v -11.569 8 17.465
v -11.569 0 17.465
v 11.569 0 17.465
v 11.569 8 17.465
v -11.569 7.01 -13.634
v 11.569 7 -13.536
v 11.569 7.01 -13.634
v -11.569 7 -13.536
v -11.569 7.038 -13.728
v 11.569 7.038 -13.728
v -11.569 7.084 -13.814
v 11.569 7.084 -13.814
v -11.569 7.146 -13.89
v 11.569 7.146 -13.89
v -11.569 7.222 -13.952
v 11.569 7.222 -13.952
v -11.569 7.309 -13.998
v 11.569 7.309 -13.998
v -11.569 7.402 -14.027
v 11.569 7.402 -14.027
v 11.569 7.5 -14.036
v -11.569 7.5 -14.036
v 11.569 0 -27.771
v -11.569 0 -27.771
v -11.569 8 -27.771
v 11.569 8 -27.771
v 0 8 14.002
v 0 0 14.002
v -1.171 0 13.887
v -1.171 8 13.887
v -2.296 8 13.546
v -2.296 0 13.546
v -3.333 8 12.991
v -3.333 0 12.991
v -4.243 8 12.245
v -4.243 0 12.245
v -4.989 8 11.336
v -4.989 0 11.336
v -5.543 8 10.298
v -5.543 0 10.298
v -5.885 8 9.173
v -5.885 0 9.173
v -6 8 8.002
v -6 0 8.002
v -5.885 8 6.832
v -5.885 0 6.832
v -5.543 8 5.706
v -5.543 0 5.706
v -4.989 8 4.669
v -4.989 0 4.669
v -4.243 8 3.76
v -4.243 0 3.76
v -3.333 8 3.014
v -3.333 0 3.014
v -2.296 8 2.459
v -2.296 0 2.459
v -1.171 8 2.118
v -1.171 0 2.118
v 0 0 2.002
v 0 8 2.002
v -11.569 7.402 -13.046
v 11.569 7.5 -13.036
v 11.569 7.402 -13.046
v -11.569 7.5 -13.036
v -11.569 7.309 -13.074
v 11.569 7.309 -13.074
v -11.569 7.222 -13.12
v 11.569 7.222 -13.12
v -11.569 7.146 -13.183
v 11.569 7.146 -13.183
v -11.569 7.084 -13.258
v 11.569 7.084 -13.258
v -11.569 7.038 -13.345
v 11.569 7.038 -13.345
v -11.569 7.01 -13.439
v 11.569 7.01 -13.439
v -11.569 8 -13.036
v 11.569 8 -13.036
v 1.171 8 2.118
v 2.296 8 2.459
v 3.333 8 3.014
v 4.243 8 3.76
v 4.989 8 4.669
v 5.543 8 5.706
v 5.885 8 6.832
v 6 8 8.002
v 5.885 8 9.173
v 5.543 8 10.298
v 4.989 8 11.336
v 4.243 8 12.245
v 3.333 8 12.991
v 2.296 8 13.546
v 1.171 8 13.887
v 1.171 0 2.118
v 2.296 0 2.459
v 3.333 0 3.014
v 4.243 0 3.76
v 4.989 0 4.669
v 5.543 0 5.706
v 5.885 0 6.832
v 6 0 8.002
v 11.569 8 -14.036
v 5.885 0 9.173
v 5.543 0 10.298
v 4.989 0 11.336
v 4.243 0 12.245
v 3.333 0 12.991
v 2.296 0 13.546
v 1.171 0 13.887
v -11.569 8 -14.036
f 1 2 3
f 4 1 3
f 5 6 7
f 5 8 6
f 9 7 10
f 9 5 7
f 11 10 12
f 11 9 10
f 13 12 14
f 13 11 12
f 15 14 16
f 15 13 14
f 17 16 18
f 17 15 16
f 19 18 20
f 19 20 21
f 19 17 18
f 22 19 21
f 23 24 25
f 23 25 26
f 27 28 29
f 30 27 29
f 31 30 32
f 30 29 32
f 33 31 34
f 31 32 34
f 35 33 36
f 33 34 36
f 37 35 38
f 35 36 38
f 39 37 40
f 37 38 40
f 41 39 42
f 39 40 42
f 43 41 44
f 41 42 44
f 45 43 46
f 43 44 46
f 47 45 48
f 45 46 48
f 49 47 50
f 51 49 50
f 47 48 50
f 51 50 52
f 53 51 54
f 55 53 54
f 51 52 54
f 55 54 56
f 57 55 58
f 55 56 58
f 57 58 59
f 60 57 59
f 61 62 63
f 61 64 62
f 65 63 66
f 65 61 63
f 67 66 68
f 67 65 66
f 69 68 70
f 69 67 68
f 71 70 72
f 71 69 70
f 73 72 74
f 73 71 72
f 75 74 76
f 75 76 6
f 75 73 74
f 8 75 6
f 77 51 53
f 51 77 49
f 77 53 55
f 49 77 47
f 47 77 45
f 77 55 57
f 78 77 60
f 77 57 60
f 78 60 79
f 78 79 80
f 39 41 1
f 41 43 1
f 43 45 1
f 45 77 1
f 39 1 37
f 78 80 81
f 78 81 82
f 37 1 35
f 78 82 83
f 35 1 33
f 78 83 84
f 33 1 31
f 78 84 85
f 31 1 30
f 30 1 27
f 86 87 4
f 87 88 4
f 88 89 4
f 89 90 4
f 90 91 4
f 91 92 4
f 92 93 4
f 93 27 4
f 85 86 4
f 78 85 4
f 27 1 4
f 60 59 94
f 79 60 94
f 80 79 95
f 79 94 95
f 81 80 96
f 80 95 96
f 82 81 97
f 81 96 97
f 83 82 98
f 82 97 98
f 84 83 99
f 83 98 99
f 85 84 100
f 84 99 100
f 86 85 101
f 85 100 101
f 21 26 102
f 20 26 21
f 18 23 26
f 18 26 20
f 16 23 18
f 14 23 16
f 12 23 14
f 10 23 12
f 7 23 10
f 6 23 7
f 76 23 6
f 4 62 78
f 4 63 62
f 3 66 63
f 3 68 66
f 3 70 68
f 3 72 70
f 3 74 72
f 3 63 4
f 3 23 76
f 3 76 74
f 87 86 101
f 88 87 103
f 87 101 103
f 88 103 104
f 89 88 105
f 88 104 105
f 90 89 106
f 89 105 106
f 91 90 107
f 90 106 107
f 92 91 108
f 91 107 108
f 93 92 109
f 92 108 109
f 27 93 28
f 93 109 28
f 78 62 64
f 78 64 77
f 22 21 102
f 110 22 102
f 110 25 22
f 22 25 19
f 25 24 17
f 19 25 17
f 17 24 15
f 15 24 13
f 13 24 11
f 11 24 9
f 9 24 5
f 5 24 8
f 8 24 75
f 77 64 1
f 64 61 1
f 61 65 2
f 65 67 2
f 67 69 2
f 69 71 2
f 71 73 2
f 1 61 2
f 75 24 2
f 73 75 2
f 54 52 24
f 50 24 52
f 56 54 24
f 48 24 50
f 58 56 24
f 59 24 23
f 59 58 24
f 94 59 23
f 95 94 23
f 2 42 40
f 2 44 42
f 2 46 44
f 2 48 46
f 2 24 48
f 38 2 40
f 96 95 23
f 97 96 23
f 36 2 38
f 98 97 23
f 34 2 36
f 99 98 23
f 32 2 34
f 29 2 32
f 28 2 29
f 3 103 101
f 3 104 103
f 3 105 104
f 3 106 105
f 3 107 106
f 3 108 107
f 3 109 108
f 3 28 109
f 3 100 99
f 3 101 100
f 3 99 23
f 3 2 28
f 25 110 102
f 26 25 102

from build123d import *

# Parameters (mm, degrees)
BOSS_EXTRUDE1_DEPTH = 8
SKETCH2_W           = 23.137445614
SKETCH2_H           = 10.306738945
BOSS_EXTRUDE2_DEPTH = 8
SKETCH4_W           = 1
SKETCH4_H           = 2
CUT_EXTRUDE1_DEPTH  = 60
FILLET1_R           = 0.5


with BuildPart() as part:
    # Sketch1 → Boss-Extrude1 (new body)
    with BuildSketch(Plane(origin=(0, 0, 0), x_dir=(1, 0, 0), z_dir=(0, 1, 0))):
        with BuildLine():
            Line((11.568722807, -17.464704369), (11.568722807, 17.464704369))
            Line((11.568722807, 17.464704369), (0, 17.464704369))
            Line((0, 17.464704369), (0, -2.002357687))
            ThreePointArc((0, -2.002357687), (4.242640687, -3.759717), (6, -8.002357687))
            ThreePointArc((6, -8.002357687), (4.242640687, -12.244998375), (0, -14.002357687))
            Line((0, -14.002357687), (0, -17.464704369))
            Line((0, -17.464704369), (11.568722807, -17.464704369))
        make_face()
        with BuildLine():
            Line((0, -2.002357687), (0, 17.464704369))
            Line((0, 17.464704369), (-11.568722807, 17.464704369))
            Line((-11.568722807, 17.464704369), (-11.568722807, -17.464704369))
            Line((-11.568722807, -17.464704369), (0, -17.464704369))
            Line((0, -17.464704369), (0, -14.002357687))
            ThreePointArc((0, -14.002357687), (-6, -8.002357687), (0, -2.002357687))
        make_face()
    extrude(amount=BOSS_EXTRUDE1_DEPTH)

    # Sketch2 → Boss-Extrude2 (add)
    with BuildSketch(Plane.XZ):
        with Locations((0, -22.618073841)):
            Rectangle(SKETCH2_W, SKETCH2_H)
    extrude(amount=-BOSS_EXTRUDE2_DEPTH)

    # Sketch4 → Cut-Extrude1 (cut)
    with BuildSketch(Plane(origin=(11.568722807, 0, 0), x_dir=(0, 0, -1), z_dir=(1, 0, 0))):
        with Locations((13.536168456, 8)):
            Rectangle(SKETCH4_W, SKETCH4_H)
    extrude(amount=-CUT_EXTRUDE1_DEPTH, mode=Mode.SUBTRACT)

    # Fillet1
    fillet1_edges = [part.edges().sort_by_distance(p)[0] for p in [
        (0, 7, -14.036168456),
        (0, 7, -13.036168456),
    ]]
    fillet(fillet1_edges, radius=FILLET1_R - 0.0001)  # a hair under: the kernel refuses the full size


solid = part.part
